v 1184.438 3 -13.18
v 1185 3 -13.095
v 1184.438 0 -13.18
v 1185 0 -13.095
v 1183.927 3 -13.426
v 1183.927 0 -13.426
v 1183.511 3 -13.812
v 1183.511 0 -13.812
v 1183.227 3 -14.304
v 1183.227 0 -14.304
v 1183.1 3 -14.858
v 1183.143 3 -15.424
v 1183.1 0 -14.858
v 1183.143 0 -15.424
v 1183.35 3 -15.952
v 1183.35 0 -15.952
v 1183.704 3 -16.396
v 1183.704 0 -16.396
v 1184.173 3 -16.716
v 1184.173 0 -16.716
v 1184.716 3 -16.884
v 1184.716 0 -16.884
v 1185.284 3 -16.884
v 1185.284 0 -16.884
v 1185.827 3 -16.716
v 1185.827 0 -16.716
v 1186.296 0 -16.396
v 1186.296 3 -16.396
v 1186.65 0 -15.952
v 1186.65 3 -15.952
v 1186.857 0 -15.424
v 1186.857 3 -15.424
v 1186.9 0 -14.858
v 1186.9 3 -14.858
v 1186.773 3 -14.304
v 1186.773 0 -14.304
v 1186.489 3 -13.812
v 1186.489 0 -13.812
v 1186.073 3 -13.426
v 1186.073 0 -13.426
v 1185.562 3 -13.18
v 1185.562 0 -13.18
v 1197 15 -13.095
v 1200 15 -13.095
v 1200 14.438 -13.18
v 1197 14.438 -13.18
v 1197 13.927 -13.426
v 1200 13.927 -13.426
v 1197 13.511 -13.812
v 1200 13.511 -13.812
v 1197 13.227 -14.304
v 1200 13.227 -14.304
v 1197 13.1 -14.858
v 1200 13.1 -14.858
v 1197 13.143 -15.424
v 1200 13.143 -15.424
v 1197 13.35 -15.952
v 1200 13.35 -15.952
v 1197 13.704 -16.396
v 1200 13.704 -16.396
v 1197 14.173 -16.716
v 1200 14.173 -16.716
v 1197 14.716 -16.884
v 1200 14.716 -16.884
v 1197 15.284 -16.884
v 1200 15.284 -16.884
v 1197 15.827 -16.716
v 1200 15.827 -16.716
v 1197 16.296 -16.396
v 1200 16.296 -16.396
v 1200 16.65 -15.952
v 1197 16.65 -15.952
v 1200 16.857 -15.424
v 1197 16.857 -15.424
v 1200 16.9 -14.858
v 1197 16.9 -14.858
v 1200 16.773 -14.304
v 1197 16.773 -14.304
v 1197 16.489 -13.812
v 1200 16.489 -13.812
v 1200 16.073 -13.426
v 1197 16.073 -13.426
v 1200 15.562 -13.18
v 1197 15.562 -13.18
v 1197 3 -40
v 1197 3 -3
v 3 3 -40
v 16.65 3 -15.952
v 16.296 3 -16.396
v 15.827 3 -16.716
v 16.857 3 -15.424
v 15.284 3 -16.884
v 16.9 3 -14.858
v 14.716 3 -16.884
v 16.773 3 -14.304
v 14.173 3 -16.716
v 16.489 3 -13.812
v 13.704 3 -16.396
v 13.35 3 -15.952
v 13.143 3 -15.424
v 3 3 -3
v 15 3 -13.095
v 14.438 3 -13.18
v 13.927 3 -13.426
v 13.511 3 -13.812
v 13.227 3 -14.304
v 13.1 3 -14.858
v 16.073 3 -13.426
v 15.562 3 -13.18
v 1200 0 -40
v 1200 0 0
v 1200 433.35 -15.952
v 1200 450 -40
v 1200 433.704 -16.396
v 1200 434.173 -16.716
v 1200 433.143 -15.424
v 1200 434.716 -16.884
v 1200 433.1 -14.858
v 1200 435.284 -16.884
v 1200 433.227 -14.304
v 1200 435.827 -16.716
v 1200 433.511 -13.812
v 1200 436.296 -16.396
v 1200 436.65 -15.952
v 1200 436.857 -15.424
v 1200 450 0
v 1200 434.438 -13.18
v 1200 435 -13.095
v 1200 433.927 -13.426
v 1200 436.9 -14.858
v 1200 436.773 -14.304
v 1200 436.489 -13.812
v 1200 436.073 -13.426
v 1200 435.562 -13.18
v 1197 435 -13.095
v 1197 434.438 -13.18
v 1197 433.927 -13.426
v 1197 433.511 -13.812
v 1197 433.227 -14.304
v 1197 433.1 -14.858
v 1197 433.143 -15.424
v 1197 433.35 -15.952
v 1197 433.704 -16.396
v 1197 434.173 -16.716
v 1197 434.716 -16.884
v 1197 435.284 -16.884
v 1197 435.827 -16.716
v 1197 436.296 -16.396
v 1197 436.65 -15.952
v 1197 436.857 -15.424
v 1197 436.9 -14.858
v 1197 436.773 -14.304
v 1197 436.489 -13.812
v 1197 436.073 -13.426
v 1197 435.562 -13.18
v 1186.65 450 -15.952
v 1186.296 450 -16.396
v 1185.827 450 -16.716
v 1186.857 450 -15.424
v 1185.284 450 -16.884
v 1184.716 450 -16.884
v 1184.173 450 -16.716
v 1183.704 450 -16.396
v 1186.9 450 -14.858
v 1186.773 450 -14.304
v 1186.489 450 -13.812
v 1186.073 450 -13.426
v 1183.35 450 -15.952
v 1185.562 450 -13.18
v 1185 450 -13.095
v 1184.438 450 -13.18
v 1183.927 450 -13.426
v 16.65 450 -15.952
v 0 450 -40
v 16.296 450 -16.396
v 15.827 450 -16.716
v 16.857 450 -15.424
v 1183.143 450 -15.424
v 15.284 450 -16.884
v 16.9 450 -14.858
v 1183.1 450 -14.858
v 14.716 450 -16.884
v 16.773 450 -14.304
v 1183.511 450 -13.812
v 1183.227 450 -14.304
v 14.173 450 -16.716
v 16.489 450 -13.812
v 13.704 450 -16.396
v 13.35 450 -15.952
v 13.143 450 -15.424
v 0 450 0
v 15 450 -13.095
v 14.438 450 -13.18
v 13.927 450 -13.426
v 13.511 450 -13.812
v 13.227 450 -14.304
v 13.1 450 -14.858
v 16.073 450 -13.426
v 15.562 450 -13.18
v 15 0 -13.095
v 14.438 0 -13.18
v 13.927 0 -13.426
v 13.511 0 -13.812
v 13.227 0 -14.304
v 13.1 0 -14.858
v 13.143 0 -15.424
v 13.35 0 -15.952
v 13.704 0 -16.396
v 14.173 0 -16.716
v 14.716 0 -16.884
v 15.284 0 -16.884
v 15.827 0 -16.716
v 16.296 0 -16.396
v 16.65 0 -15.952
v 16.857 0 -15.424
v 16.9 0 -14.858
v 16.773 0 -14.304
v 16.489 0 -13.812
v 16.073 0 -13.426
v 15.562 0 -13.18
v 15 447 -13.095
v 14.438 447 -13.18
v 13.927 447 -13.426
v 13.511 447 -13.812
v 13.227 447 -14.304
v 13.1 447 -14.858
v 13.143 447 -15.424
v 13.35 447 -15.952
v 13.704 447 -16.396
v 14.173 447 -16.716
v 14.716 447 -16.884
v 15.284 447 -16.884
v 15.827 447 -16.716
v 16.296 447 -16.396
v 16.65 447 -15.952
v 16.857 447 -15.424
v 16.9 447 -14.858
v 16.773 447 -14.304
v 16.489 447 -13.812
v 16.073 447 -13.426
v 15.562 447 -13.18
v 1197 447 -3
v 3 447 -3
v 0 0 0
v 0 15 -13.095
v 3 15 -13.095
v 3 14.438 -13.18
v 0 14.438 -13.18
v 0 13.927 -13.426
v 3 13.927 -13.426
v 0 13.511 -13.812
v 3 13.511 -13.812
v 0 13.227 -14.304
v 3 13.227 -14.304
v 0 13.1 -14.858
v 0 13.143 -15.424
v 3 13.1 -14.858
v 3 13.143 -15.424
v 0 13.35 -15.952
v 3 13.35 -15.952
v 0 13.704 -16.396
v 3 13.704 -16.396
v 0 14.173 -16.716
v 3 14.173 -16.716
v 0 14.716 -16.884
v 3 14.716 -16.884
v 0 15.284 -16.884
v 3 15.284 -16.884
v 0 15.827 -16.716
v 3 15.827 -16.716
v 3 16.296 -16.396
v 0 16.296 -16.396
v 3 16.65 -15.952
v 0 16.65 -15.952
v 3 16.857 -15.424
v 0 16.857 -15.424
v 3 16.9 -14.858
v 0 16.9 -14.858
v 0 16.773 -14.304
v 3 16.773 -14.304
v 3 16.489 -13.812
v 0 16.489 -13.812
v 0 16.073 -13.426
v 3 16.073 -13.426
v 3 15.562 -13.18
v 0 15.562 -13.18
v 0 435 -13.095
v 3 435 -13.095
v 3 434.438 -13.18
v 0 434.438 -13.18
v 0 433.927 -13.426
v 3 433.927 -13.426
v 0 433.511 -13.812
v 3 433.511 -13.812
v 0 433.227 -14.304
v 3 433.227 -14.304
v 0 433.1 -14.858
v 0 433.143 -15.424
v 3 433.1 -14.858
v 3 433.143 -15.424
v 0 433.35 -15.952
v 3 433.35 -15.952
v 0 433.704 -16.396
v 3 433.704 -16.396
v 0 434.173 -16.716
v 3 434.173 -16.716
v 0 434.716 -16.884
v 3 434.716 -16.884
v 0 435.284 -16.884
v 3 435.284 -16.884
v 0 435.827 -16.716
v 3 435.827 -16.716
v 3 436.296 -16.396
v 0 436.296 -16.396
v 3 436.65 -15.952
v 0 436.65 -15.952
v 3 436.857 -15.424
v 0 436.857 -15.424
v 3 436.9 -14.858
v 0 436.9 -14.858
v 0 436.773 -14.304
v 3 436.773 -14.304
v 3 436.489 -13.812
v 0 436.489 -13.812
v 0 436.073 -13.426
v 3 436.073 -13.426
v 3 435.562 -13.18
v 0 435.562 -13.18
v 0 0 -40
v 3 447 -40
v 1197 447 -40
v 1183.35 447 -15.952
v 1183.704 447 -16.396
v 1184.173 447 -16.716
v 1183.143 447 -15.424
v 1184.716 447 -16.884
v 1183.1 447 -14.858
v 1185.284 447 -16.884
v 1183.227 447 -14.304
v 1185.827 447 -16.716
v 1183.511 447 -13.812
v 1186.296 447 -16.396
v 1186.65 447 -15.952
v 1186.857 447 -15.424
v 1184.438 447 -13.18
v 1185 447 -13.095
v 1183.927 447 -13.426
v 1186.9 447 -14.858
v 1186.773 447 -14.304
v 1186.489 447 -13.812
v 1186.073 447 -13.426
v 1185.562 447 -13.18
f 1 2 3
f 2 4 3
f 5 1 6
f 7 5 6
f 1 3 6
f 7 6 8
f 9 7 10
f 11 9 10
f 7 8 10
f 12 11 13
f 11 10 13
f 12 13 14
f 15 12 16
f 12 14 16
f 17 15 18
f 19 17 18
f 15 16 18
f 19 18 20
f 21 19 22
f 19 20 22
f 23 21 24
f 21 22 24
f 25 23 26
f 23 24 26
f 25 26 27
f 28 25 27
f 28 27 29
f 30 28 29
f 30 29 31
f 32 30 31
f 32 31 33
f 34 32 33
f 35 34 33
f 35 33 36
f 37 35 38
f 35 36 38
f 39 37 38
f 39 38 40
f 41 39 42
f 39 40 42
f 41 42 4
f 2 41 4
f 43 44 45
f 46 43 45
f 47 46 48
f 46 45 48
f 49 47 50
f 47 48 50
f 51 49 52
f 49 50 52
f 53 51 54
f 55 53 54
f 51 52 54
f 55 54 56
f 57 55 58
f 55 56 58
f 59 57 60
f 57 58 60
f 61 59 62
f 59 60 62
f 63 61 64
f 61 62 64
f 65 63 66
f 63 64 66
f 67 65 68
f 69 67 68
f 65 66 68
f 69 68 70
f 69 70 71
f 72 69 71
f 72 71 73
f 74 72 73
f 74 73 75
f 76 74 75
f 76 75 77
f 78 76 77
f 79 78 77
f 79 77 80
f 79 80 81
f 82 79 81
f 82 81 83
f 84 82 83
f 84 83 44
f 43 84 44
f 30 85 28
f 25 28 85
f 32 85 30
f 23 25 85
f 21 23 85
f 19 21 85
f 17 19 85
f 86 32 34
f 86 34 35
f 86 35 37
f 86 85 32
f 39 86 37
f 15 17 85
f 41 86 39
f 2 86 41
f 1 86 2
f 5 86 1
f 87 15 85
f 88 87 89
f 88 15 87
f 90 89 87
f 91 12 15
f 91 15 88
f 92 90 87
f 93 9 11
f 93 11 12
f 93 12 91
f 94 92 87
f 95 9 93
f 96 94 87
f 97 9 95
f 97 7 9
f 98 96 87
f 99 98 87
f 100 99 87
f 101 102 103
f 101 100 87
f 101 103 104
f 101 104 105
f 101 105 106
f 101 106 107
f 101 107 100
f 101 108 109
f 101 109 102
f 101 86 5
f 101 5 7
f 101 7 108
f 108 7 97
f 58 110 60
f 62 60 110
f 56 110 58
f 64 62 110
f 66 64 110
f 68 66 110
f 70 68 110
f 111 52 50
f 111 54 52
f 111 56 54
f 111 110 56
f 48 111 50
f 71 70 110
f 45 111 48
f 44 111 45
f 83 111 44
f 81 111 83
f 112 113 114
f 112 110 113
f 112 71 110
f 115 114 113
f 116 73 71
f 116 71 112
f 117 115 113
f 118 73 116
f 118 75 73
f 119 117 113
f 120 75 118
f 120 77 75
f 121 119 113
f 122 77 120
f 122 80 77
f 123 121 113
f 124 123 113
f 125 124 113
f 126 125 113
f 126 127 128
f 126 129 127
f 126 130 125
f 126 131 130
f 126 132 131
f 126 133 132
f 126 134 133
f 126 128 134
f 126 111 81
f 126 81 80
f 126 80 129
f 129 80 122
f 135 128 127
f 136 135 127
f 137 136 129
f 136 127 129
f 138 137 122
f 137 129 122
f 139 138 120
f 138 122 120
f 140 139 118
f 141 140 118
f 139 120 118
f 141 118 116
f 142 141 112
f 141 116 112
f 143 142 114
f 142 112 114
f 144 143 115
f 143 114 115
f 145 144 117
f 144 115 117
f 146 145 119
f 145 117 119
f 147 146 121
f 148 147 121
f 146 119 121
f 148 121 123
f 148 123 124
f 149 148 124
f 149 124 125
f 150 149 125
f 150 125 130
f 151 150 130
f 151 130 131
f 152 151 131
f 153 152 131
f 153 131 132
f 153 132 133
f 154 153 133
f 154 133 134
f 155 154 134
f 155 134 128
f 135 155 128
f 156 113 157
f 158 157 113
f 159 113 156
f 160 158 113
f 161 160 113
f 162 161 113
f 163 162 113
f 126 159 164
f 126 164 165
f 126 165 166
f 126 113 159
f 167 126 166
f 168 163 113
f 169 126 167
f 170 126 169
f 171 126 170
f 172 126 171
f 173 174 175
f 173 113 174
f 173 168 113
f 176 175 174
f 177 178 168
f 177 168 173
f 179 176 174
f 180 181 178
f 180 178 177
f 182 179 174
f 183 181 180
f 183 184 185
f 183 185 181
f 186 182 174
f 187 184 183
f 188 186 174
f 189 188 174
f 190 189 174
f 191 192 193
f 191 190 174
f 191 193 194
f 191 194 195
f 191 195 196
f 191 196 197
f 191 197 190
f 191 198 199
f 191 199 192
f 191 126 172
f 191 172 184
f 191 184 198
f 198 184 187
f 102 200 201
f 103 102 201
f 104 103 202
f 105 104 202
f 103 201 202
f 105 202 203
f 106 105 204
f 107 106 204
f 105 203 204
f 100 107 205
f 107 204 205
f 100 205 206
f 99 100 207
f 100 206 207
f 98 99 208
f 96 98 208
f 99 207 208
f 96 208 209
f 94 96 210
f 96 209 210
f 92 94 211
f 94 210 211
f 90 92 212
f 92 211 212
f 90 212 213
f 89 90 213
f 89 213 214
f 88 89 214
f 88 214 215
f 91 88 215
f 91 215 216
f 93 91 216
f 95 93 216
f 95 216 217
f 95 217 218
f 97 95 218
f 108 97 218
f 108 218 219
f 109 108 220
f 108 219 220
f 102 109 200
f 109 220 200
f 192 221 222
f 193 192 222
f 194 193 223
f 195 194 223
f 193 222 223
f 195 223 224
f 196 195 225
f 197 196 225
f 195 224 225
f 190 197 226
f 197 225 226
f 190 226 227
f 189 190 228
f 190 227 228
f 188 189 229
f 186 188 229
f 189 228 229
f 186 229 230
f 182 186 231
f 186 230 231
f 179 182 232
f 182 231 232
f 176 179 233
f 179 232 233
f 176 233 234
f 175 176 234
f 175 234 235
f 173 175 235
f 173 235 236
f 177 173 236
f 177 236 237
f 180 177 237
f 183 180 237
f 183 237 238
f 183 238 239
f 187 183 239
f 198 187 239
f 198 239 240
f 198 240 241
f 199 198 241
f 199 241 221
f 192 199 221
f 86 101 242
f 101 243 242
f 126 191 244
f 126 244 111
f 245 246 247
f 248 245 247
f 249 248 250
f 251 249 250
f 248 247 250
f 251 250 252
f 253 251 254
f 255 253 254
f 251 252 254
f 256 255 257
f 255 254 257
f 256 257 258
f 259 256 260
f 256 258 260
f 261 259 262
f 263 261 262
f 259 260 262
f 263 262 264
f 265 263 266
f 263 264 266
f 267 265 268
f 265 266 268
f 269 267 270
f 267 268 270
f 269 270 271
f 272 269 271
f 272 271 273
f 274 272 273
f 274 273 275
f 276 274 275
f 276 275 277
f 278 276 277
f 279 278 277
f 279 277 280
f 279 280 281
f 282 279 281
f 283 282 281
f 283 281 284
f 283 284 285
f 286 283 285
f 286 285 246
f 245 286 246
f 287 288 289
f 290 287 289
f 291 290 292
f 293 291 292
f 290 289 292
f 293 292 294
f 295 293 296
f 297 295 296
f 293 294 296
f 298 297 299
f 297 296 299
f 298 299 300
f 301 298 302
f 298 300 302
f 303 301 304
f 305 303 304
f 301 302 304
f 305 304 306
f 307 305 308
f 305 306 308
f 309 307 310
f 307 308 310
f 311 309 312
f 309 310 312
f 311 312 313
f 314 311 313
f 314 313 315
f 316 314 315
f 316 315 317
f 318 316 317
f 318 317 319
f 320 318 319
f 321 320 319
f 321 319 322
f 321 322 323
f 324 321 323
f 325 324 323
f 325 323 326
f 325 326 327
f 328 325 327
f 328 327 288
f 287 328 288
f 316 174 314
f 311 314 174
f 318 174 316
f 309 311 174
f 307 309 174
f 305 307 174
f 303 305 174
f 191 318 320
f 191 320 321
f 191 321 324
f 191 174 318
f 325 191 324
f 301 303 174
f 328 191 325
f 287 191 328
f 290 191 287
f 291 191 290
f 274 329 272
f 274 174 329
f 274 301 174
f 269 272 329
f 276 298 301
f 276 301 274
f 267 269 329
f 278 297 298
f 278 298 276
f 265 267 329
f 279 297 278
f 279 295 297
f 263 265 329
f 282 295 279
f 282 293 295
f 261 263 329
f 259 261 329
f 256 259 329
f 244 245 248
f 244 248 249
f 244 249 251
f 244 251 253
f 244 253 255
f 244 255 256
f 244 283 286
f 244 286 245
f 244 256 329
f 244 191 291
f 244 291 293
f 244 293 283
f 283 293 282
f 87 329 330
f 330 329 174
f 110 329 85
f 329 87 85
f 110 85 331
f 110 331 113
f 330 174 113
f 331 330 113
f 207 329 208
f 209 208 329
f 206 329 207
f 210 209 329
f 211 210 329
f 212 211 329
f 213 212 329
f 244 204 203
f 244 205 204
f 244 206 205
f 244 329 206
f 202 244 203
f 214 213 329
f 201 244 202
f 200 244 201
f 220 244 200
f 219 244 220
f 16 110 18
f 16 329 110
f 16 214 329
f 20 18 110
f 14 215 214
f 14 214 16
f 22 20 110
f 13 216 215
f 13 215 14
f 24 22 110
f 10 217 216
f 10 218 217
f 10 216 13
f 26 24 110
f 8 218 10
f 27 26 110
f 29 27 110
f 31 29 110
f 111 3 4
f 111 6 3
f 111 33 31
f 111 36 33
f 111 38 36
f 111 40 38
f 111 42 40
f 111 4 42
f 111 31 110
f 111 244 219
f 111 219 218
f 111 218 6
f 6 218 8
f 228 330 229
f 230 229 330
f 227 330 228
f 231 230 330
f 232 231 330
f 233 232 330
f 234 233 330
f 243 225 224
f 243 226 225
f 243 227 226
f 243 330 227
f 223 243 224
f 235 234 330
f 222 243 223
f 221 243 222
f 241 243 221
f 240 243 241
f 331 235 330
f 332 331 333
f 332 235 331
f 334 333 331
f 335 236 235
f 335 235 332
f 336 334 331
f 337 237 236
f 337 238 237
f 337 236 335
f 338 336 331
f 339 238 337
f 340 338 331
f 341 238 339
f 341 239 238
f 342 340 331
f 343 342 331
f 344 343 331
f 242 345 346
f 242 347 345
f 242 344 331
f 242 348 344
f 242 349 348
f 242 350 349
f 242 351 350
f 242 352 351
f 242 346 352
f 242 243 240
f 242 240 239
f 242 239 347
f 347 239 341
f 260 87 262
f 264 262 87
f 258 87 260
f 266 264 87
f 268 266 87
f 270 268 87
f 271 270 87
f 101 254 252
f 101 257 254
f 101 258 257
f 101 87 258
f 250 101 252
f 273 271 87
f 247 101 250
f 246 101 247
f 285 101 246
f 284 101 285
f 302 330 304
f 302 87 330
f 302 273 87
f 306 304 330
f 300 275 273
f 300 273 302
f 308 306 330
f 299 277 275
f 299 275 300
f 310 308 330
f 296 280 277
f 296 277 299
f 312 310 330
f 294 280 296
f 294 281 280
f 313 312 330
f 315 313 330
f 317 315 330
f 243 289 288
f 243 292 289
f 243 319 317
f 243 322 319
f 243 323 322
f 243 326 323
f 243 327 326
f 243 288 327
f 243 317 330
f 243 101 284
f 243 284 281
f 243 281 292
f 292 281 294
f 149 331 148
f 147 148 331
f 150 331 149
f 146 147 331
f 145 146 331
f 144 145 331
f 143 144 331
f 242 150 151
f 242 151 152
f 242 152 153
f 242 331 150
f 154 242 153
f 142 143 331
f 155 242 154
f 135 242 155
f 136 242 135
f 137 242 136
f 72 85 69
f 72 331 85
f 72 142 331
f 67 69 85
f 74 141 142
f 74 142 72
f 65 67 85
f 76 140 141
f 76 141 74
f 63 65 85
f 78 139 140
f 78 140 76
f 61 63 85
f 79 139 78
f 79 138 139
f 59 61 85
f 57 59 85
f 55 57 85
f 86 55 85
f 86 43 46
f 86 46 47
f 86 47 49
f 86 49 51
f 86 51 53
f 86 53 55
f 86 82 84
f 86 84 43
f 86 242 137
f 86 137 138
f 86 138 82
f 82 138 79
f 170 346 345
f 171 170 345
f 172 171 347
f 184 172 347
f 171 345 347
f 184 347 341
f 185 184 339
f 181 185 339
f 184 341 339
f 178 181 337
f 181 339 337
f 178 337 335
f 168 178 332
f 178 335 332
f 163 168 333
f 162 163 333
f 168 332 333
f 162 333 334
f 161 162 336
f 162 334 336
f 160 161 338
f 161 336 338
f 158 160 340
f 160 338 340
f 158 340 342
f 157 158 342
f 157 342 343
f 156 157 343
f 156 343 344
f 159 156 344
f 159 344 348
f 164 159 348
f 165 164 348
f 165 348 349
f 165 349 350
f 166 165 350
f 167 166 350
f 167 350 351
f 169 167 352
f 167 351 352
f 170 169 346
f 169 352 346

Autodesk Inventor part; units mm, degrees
ref_plane "YZ Plane" through (0, 0, 0) normal (1, 0, 0) x (0, 1, 0)
ref_plane "XZ Plane" through (0, 0, 0) normal (0, 1, 0) x (-1, 0, 0)
ref_plane "XY Plane" through (0, 0, 0) normal (0, 0, 1) x (1, 0, 0)
sketch "Sketch1" plane through (0, 0, 0) normal (0, 0, 1) x (1, 0, 0)
  line L0 (0, 0) -> (1200, 0)
  line L1 (1200, 0) -> (1200, 450)
  line L2 (1200, 450) -> (0, 450)
  line L3 (0, 450) -> (0, 0)
  line L4 (3, 447) -> (1197, 447)
  line L5 (1197, 447) -> (1197, 3)
  line L6 (1197, 3) -> (3, 3)
  line L7 (3, 3) -> (3, 447)
  dimension "d8" = 1200
  dimension "d9" = 450
  dimension "d10" = 3
extrude "Extrusion2" add sketch "Sketch1" against normal blind 40
extrude "Extrusion3" add sketch "Sketch1" against normal blind 3 contours L3 L2 L1 L0 | L4 L5 L6 L7
sketch "Sketch2" plane through (0, 450, -40) normal (0, 1, 0) x (1, 0, 0)
  line L0 (0, -40) -> (0, 0) projected
  line L1 (1200, -40) -> (0, -40) projected
  line L2 (1200, -40) -> (1200, 0) projected
  point P0 (15, -25)
  point P1 (1185, -25)
  dimension "d22" = 15
  dimension "d23" = 15
  dimension "d24" = 15
  dimension "d25" = 15
hole "Hole1" at (15, 450, -15) at (1185, 450, -15) direction (0, -1, 0) diameter 3.81 end through all
sketch "Sketch3" plane through (0, 0, -40) normal (-1, 0, 0) x (0, 0, 1)
  line L0 (40, 450) -> (40, 0) projected
  line L1 (40, 0) -> (0, 0) projected
  line L2 (40, 450) -> (0, 450) projected
  point P0 (25, 15)
  point P1 (25, 435)
  dimension "d26" = 15
  dimension "d27" = 15
  dimension "d28" = 15
  dimension "d29" = 15
hole "Hole2" at (0, 15, -15) at (0, 435, -15) direction (1, 0, 0) diameter 3.81 end through all
equation "\"d8\" = Width"
equation "\"d9\" = Depth"
equation "\"d10\" = Thickness"
equation "\"d11\" = Height"
equation "\"d13\" = Thickness"
equation "\"d22\" = HoleDistance"
equation "\"d23\" = HoleDistance"
equation "\"d24\" = HoleDistance"
equation "\"d25\" = HoleDistance"
equation "\"d26\" = HoleDistance"
equation "\"d27\" = HoleDistance"
equation "\"d28\" = HoleDistance"
equation "\"d29\" = HoleDistance"
equation "\"Width\" = 1200"
equation "\"Thickness\" = 3"
equation "\"Depth\" = 450"
equation "\"Height\" = 40"
equation "\"HoleDistance\" = 15"
properties part number "shelf120"
